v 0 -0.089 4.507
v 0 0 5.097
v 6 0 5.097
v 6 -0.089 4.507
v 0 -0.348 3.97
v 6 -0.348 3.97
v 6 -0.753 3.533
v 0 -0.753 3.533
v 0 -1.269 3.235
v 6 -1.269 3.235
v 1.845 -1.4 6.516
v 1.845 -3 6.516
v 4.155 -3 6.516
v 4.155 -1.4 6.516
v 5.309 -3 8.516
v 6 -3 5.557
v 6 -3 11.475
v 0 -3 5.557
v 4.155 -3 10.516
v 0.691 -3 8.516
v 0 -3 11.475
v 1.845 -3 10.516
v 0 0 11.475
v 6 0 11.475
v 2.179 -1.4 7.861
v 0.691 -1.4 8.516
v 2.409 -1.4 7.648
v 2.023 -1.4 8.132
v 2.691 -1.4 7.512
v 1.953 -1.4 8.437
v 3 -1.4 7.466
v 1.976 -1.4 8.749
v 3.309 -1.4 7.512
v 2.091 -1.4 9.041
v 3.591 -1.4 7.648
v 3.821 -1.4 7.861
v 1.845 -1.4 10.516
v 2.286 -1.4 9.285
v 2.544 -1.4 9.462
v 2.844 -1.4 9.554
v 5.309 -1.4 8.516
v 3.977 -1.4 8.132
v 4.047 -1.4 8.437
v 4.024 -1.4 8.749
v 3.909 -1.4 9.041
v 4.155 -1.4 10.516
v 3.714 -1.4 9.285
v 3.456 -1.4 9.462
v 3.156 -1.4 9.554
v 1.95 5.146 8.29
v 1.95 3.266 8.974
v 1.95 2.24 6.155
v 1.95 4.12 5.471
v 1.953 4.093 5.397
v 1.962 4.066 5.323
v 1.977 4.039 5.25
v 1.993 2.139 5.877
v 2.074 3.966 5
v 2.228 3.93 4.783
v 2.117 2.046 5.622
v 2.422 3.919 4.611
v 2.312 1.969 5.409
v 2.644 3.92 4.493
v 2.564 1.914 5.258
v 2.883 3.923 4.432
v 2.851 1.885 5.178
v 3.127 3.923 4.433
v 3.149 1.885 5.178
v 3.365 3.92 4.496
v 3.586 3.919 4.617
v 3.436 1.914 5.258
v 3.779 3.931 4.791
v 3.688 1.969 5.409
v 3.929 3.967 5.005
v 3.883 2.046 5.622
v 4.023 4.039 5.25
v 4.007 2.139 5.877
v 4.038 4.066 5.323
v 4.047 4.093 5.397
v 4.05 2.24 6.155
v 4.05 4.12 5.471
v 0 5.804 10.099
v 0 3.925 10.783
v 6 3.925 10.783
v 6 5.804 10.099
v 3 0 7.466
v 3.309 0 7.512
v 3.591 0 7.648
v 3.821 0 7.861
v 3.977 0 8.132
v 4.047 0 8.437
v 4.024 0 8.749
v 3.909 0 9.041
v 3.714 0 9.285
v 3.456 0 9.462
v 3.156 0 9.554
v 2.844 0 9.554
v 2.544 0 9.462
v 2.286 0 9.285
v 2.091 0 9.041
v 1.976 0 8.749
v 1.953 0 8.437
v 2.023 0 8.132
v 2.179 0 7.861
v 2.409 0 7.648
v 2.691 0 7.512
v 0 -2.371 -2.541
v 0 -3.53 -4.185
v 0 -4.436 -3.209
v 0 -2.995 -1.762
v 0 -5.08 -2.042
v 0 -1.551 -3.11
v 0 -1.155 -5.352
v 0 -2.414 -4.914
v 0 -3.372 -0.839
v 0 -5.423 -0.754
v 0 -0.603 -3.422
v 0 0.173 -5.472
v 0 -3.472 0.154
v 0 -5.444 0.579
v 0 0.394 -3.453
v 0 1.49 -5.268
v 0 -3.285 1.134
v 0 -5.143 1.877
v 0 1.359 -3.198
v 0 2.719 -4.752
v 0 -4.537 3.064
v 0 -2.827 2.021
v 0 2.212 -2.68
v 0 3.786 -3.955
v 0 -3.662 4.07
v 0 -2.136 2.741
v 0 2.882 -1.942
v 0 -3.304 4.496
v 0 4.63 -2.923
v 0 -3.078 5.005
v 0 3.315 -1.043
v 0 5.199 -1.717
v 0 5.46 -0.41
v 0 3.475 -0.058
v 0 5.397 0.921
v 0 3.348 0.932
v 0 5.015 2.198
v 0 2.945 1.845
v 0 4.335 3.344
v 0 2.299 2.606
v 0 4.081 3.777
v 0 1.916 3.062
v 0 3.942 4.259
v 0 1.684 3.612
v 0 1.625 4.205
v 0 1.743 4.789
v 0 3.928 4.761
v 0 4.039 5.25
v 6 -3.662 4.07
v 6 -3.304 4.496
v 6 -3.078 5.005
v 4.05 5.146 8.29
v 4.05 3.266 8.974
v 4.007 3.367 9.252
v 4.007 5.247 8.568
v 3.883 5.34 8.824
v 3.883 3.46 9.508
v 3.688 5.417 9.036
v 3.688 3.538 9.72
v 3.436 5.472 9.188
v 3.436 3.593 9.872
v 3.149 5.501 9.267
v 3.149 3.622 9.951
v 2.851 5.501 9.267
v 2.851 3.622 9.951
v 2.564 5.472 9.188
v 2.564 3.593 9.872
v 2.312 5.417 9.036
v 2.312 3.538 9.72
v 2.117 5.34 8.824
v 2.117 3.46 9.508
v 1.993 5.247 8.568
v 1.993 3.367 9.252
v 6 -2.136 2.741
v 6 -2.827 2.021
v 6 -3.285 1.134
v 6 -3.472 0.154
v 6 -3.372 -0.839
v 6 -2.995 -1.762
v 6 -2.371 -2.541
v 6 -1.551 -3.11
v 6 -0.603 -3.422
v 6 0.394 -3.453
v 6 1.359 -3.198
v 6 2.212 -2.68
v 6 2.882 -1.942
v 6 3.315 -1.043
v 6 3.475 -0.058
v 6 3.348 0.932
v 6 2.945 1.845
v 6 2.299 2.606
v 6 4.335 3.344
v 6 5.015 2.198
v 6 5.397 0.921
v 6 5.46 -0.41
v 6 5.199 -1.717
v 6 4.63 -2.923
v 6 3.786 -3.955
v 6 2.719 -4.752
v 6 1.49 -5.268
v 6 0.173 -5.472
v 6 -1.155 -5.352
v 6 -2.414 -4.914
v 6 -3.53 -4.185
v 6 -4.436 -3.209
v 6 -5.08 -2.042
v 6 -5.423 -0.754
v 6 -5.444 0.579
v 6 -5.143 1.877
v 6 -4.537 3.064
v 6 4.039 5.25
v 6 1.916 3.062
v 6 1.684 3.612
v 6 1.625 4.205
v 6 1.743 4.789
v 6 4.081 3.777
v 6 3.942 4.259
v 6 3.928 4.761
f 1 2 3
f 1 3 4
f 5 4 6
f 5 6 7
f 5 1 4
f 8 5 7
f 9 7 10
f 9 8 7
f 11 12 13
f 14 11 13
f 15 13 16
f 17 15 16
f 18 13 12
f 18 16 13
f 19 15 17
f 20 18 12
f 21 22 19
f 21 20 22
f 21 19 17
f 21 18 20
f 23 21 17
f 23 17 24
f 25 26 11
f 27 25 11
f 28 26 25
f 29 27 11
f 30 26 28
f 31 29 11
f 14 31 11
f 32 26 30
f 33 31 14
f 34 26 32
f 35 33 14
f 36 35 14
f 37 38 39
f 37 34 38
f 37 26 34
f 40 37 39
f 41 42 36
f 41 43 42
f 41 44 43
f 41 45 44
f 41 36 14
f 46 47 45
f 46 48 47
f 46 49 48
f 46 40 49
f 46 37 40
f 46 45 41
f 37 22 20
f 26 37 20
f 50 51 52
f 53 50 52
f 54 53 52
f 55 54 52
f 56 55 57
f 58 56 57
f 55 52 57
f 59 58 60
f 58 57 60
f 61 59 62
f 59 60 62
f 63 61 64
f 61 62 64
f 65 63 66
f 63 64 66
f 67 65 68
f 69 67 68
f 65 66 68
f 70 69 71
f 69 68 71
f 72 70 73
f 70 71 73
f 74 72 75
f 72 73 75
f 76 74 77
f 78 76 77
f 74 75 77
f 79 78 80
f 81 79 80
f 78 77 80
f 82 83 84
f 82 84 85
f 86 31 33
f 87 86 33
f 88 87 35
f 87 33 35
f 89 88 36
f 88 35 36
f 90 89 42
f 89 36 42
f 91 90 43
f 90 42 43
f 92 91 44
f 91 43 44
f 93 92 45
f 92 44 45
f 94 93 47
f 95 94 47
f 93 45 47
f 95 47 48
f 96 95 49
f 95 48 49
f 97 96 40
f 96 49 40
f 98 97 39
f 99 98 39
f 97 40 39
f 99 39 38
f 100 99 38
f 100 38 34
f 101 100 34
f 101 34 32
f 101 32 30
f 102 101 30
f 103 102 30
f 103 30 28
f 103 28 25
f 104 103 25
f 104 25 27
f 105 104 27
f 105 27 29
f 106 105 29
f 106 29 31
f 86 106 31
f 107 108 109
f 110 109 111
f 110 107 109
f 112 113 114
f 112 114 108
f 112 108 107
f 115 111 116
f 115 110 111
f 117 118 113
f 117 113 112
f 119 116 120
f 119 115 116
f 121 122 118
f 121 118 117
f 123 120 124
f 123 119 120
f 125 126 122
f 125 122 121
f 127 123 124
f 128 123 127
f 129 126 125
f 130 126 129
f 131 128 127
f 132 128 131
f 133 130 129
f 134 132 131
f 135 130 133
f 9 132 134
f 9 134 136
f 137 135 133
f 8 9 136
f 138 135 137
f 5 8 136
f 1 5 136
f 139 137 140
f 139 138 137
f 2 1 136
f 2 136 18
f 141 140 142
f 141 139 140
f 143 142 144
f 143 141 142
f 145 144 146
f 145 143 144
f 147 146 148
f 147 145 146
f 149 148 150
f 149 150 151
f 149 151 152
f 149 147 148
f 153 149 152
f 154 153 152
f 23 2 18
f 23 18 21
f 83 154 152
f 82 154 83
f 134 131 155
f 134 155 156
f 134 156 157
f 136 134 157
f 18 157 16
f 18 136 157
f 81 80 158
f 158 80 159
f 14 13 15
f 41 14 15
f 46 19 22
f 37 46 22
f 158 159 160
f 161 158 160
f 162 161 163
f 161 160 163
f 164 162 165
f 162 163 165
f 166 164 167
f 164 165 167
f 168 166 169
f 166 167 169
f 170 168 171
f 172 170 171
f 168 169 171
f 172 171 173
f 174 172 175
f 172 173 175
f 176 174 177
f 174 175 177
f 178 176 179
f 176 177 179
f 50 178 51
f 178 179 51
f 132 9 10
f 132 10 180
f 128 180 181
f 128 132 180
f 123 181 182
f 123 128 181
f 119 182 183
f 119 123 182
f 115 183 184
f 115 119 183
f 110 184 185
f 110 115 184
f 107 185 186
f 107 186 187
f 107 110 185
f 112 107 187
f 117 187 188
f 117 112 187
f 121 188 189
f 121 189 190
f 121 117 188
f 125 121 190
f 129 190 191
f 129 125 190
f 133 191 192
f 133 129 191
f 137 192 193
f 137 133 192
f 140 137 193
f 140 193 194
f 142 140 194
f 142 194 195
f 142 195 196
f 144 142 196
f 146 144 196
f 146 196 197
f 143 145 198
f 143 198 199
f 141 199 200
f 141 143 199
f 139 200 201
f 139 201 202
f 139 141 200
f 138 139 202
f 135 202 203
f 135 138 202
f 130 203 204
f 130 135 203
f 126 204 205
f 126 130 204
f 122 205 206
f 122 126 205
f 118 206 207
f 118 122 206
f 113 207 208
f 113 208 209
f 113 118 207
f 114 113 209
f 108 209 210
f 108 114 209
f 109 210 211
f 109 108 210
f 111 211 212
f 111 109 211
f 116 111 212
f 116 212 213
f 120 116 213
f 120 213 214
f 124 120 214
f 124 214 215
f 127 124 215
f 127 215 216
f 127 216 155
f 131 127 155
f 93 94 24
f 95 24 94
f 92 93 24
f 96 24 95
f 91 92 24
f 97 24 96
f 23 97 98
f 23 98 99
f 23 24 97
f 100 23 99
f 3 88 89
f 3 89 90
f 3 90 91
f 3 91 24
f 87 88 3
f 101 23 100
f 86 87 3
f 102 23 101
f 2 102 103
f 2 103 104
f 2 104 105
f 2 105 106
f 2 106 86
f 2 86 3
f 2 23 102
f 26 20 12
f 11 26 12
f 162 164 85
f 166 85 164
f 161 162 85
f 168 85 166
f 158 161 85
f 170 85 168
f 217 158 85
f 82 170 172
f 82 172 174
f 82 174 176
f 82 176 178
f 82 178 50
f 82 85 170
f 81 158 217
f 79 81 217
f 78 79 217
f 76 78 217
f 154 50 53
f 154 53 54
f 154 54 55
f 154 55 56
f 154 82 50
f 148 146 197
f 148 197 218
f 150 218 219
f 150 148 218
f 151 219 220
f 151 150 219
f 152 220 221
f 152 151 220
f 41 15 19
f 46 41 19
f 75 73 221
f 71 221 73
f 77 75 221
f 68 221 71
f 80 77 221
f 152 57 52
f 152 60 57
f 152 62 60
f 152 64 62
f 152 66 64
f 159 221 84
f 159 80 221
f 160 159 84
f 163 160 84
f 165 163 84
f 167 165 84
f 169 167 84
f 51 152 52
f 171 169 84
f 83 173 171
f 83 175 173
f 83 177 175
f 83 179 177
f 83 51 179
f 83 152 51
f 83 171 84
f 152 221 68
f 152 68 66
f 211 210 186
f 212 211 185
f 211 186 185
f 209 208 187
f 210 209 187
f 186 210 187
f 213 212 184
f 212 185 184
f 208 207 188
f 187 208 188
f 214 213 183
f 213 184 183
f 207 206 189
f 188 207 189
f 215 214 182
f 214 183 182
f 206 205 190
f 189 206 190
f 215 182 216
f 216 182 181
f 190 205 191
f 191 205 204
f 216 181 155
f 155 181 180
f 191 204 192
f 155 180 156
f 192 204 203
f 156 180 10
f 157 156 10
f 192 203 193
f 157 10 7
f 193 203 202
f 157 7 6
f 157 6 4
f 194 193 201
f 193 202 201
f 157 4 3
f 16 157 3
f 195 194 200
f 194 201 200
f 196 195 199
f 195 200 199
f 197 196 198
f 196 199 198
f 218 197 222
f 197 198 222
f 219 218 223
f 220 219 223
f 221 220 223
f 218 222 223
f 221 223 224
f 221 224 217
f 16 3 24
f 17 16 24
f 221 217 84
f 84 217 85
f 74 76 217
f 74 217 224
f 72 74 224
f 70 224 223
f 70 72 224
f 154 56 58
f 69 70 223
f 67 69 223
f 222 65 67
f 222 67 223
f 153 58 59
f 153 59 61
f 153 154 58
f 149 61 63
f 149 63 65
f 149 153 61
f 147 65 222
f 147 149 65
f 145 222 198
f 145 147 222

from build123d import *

# Parameters (mm, degrees)
BOSS_EXTRUDE1_DEPTH     = 6
CUT_EXTRUDE1_DEPTH      = 10
CUT_EXTRUDE1_DEPTH_BACK = 2
SKETCH4_R               = 1.05
CUT_EXTRUDE2_DEPTH      = 1.6
SKETCH4_2_R             = 1.05
CUT_EXTRUDE3_DEPTH      = 4


with BuildPart() as part:
    # Sketch1 → Boss-Extrude1 (new body)
    with BuildSketch(Plane(origin=(0, 0, 0), x_dir=(0, 0, -1), z_dir=(1, 0, 0))):
        with BuildLine():
            Line((-11.475, 0), (-5.096628788, 0))
            ThreePointArc((-5.096628788, 0), (-3.969949422, -0.347549212), (-3.234846582, -1.269406393))
            ThreePointArc((-3.234846582, -1.269406393), (3.422206942, -0.603427417), (-2.605598906, 2.299234512))
            ThreePointArc((-2.605598906, 2.299234512), (-3.611663346, 1.6843921), (-4.789264463, 1.743149708))
            Line((-4.789264463, 1.743149708), (-10.782972824, 3.924681145))
            Line((-10.782972824, 3.924681145), (-10.098932537, 5.804066386))
            Line((-10.098932537, 5.804066386), (-5.249850762, 4.039144957))
            ThreePointArc((-5.249850762, 4.039144957), (-4.259008351, 3.942202175), (-3.344188943, 4.334976968))
            ThreePointArc((-3.344188943, 4.334976968), (5.452597189, -0.494781667), (-4.069872513, -3.662207358))
            ThreePointArc((-4.069872513, -3.662207358), (-4.742822691, -3.173037318), (-5.556583933, -3))
            Line((-5.556583933, -3), (-11.475, -3))
            Line((-11.475, -3), (-11.475, -2))
            Line((-11.475, -2), (-11.475, 0))
        make_face()
    extrude(amount=BOSS_EXTRUDE1_DEPTH)

    # Sketch3 → Cut-Extrude1 (cut, two sides: drawn at the far end of the back side and taken through both)
    with BuildSketch(Plane(origin=(0, 1.879385242, -0.684040287), x_dir=(1, 0, 0), z_dir=(0, 0.9396926207859091, -0.34202014332566716)).offset(-CUT_EXTRUDE1_DEPTH_BACK)):
        with BuildLine():
            Line((4.05, -6.550079558), (4.05, -9.550079558))
            ThreePointArc((4.05, -9.550079558), (3, -10.600079558), (1.95, -9.550079558))
            Line((1.95, -9.550079558), (1.95, -6.550079558))
            ThreePointArc((1.95, -6.550079558), (3, -5.500079558), (4.05, -6.550079558))
        make_face()
    extrude(amount=CUT_EXTRUDE1_DEPTH + CUT_EXTRUDE1_DEPTH_BACK, mode=Mode.SUBTRACT)

    # Sketch4 → Cut-Extrude2 (cut)
    with BuildSketch(Plane.XZ.offset(3)):
        Polygon((4.154700538, 10.515791966), (1.845299462, 10.515791966), (0.690598923, 8.515791966), (1.845299462, 6.515791966), (4.154700538, 6.515791966), (5.309401077, 8.515791966), align=None)
        with Locations((3, 8.515791966)):
            Circle(SKETCH4_R, mode=Mode.SUBTRACT)
    extrude(amount=-CUT_EXTRUDE2_DEPTH, mode=Mode.SUBTRACT)

    # Sketch4<2> → Cut-Extrude3 (cut)
    with BuildSketch(Plane.XZ.offset(3)):
        with Locations((3, 8.515791966)):
            Circle(SKETCH4_2_R)
    extrude(amount=-CUT_EXTRUDE3_DEPTH, mode=Mode.SUBTRACT)


solid = part.part
